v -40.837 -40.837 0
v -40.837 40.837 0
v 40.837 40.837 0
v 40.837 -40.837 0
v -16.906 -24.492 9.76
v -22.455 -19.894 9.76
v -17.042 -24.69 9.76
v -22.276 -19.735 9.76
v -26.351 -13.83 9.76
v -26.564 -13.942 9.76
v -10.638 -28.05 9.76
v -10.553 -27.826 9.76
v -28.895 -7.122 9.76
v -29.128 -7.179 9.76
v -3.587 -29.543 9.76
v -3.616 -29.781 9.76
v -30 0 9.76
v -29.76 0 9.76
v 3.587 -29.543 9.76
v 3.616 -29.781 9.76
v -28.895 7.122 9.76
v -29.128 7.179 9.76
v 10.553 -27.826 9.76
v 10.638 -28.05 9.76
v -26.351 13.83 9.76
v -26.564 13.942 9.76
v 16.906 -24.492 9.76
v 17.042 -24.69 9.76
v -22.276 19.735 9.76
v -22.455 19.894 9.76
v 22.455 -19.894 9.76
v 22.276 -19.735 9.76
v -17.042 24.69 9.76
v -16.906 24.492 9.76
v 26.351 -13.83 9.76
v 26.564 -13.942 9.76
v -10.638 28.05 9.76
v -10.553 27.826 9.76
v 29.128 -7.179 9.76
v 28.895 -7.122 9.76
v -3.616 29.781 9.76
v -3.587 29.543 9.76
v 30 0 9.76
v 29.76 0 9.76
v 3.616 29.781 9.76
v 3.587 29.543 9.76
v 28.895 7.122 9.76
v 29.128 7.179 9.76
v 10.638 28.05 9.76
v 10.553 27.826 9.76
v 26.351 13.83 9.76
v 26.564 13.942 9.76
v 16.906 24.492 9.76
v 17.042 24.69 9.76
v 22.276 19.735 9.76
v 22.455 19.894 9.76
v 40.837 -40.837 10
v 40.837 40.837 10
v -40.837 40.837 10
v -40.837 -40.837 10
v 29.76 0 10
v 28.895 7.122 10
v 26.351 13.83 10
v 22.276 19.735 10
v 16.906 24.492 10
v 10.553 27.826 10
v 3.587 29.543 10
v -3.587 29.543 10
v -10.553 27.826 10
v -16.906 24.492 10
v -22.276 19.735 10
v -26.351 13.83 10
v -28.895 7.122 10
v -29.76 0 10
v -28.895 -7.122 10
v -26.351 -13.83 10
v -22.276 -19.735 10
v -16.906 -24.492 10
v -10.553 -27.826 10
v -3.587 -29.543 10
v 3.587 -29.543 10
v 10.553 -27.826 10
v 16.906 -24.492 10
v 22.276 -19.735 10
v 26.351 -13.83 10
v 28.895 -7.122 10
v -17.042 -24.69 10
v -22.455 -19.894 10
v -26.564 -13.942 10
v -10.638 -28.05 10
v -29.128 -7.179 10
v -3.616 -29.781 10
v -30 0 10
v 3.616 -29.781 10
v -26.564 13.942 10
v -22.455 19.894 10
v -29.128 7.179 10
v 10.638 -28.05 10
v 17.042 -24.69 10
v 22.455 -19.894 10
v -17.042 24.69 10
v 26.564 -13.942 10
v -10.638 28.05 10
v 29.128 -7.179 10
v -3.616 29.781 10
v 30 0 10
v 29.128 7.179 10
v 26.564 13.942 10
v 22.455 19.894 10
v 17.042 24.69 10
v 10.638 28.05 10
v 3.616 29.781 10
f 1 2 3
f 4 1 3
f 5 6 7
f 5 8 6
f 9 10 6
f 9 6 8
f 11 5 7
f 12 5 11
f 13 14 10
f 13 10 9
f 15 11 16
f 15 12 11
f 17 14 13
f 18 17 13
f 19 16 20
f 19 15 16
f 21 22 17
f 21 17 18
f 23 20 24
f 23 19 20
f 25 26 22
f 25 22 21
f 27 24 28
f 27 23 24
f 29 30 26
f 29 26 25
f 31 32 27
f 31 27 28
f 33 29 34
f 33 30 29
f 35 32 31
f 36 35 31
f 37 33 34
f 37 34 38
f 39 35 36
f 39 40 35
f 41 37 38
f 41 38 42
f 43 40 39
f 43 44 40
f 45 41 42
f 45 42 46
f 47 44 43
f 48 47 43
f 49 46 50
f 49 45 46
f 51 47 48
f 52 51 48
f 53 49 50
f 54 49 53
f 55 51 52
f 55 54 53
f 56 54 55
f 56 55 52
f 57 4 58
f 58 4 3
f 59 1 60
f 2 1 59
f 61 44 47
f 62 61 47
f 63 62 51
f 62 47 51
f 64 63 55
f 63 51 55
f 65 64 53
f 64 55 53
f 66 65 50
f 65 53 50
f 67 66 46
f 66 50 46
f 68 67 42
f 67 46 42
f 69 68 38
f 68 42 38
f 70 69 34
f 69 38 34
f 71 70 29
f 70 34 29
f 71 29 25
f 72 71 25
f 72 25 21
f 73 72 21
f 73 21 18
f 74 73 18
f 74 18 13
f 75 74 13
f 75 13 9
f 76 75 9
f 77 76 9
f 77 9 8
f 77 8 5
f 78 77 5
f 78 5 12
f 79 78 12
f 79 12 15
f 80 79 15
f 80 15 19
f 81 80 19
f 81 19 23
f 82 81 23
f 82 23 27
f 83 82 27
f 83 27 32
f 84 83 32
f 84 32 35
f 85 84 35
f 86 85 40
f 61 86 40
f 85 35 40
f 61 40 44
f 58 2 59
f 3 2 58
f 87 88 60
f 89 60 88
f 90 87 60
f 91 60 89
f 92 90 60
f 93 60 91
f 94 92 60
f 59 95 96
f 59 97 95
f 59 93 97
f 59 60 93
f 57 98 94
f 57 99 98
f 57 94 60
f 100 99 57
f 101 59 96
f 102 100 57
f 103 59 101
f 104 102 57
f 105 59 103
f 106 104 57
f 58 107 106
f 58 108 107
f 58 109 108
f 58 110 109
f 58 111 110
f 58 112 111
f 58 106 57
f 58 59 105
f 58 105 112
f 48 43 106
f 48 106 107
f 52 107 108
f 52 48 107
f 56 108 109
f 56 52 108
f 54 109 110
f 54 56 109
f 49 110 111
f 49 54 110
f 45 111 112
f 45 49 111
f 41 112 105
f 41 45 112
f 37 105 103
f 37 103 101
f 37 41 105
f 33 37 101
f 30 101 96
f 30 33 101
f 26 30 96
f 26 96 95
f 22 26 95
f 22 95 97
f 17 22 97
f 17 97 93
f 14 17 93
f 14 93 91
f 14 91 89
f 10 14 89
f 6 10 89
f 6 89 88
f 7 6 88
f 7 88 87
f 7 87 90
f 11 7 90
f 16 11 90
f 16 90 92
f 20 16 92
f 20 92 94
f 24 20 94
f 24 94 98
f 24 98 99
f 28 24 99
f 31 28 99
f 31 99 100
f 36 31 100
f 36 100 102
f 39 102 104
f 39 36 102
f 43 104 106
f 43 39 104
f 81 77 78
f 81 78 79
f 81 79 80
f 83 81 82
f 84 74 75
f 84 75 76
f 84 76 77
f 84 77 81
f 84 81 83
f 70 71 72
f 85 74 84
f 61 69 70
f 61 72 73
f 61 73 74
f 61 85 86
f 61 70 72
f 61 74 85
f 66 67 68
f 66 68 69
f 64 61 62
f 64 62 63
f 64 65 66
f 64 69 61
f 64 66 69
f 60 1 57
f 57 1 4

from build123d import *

# Parameters (mm, degrees)
F0_R     = 30
F0_R_2   = 29.76
F1_DEPTH = 9.76
F0_W     = 81.6731601419
F0_H     = 81.6731601419
F2_DEPTH = 10


with BuildPart() as f1:
    # F0 (on Top) → F1 (new body)
    with BuildSketch(Plane.XY):
        Circle(F0_R)
        Circle(F0_R_2, mode=Mode.SUBTRACT)
    extrude(amount=F1_DEPTH)

    # F0 (on Top) → F2 (join)
    with BuildSketch(Plane.XY):
        Rectangle(F0_W, F0_H)
        Circle(F0_R, mode=Mode.SUBTRACT)
        Circle(F0_R_2)
    extrude(amount=F2_DEPTH)


solid = f1.part
